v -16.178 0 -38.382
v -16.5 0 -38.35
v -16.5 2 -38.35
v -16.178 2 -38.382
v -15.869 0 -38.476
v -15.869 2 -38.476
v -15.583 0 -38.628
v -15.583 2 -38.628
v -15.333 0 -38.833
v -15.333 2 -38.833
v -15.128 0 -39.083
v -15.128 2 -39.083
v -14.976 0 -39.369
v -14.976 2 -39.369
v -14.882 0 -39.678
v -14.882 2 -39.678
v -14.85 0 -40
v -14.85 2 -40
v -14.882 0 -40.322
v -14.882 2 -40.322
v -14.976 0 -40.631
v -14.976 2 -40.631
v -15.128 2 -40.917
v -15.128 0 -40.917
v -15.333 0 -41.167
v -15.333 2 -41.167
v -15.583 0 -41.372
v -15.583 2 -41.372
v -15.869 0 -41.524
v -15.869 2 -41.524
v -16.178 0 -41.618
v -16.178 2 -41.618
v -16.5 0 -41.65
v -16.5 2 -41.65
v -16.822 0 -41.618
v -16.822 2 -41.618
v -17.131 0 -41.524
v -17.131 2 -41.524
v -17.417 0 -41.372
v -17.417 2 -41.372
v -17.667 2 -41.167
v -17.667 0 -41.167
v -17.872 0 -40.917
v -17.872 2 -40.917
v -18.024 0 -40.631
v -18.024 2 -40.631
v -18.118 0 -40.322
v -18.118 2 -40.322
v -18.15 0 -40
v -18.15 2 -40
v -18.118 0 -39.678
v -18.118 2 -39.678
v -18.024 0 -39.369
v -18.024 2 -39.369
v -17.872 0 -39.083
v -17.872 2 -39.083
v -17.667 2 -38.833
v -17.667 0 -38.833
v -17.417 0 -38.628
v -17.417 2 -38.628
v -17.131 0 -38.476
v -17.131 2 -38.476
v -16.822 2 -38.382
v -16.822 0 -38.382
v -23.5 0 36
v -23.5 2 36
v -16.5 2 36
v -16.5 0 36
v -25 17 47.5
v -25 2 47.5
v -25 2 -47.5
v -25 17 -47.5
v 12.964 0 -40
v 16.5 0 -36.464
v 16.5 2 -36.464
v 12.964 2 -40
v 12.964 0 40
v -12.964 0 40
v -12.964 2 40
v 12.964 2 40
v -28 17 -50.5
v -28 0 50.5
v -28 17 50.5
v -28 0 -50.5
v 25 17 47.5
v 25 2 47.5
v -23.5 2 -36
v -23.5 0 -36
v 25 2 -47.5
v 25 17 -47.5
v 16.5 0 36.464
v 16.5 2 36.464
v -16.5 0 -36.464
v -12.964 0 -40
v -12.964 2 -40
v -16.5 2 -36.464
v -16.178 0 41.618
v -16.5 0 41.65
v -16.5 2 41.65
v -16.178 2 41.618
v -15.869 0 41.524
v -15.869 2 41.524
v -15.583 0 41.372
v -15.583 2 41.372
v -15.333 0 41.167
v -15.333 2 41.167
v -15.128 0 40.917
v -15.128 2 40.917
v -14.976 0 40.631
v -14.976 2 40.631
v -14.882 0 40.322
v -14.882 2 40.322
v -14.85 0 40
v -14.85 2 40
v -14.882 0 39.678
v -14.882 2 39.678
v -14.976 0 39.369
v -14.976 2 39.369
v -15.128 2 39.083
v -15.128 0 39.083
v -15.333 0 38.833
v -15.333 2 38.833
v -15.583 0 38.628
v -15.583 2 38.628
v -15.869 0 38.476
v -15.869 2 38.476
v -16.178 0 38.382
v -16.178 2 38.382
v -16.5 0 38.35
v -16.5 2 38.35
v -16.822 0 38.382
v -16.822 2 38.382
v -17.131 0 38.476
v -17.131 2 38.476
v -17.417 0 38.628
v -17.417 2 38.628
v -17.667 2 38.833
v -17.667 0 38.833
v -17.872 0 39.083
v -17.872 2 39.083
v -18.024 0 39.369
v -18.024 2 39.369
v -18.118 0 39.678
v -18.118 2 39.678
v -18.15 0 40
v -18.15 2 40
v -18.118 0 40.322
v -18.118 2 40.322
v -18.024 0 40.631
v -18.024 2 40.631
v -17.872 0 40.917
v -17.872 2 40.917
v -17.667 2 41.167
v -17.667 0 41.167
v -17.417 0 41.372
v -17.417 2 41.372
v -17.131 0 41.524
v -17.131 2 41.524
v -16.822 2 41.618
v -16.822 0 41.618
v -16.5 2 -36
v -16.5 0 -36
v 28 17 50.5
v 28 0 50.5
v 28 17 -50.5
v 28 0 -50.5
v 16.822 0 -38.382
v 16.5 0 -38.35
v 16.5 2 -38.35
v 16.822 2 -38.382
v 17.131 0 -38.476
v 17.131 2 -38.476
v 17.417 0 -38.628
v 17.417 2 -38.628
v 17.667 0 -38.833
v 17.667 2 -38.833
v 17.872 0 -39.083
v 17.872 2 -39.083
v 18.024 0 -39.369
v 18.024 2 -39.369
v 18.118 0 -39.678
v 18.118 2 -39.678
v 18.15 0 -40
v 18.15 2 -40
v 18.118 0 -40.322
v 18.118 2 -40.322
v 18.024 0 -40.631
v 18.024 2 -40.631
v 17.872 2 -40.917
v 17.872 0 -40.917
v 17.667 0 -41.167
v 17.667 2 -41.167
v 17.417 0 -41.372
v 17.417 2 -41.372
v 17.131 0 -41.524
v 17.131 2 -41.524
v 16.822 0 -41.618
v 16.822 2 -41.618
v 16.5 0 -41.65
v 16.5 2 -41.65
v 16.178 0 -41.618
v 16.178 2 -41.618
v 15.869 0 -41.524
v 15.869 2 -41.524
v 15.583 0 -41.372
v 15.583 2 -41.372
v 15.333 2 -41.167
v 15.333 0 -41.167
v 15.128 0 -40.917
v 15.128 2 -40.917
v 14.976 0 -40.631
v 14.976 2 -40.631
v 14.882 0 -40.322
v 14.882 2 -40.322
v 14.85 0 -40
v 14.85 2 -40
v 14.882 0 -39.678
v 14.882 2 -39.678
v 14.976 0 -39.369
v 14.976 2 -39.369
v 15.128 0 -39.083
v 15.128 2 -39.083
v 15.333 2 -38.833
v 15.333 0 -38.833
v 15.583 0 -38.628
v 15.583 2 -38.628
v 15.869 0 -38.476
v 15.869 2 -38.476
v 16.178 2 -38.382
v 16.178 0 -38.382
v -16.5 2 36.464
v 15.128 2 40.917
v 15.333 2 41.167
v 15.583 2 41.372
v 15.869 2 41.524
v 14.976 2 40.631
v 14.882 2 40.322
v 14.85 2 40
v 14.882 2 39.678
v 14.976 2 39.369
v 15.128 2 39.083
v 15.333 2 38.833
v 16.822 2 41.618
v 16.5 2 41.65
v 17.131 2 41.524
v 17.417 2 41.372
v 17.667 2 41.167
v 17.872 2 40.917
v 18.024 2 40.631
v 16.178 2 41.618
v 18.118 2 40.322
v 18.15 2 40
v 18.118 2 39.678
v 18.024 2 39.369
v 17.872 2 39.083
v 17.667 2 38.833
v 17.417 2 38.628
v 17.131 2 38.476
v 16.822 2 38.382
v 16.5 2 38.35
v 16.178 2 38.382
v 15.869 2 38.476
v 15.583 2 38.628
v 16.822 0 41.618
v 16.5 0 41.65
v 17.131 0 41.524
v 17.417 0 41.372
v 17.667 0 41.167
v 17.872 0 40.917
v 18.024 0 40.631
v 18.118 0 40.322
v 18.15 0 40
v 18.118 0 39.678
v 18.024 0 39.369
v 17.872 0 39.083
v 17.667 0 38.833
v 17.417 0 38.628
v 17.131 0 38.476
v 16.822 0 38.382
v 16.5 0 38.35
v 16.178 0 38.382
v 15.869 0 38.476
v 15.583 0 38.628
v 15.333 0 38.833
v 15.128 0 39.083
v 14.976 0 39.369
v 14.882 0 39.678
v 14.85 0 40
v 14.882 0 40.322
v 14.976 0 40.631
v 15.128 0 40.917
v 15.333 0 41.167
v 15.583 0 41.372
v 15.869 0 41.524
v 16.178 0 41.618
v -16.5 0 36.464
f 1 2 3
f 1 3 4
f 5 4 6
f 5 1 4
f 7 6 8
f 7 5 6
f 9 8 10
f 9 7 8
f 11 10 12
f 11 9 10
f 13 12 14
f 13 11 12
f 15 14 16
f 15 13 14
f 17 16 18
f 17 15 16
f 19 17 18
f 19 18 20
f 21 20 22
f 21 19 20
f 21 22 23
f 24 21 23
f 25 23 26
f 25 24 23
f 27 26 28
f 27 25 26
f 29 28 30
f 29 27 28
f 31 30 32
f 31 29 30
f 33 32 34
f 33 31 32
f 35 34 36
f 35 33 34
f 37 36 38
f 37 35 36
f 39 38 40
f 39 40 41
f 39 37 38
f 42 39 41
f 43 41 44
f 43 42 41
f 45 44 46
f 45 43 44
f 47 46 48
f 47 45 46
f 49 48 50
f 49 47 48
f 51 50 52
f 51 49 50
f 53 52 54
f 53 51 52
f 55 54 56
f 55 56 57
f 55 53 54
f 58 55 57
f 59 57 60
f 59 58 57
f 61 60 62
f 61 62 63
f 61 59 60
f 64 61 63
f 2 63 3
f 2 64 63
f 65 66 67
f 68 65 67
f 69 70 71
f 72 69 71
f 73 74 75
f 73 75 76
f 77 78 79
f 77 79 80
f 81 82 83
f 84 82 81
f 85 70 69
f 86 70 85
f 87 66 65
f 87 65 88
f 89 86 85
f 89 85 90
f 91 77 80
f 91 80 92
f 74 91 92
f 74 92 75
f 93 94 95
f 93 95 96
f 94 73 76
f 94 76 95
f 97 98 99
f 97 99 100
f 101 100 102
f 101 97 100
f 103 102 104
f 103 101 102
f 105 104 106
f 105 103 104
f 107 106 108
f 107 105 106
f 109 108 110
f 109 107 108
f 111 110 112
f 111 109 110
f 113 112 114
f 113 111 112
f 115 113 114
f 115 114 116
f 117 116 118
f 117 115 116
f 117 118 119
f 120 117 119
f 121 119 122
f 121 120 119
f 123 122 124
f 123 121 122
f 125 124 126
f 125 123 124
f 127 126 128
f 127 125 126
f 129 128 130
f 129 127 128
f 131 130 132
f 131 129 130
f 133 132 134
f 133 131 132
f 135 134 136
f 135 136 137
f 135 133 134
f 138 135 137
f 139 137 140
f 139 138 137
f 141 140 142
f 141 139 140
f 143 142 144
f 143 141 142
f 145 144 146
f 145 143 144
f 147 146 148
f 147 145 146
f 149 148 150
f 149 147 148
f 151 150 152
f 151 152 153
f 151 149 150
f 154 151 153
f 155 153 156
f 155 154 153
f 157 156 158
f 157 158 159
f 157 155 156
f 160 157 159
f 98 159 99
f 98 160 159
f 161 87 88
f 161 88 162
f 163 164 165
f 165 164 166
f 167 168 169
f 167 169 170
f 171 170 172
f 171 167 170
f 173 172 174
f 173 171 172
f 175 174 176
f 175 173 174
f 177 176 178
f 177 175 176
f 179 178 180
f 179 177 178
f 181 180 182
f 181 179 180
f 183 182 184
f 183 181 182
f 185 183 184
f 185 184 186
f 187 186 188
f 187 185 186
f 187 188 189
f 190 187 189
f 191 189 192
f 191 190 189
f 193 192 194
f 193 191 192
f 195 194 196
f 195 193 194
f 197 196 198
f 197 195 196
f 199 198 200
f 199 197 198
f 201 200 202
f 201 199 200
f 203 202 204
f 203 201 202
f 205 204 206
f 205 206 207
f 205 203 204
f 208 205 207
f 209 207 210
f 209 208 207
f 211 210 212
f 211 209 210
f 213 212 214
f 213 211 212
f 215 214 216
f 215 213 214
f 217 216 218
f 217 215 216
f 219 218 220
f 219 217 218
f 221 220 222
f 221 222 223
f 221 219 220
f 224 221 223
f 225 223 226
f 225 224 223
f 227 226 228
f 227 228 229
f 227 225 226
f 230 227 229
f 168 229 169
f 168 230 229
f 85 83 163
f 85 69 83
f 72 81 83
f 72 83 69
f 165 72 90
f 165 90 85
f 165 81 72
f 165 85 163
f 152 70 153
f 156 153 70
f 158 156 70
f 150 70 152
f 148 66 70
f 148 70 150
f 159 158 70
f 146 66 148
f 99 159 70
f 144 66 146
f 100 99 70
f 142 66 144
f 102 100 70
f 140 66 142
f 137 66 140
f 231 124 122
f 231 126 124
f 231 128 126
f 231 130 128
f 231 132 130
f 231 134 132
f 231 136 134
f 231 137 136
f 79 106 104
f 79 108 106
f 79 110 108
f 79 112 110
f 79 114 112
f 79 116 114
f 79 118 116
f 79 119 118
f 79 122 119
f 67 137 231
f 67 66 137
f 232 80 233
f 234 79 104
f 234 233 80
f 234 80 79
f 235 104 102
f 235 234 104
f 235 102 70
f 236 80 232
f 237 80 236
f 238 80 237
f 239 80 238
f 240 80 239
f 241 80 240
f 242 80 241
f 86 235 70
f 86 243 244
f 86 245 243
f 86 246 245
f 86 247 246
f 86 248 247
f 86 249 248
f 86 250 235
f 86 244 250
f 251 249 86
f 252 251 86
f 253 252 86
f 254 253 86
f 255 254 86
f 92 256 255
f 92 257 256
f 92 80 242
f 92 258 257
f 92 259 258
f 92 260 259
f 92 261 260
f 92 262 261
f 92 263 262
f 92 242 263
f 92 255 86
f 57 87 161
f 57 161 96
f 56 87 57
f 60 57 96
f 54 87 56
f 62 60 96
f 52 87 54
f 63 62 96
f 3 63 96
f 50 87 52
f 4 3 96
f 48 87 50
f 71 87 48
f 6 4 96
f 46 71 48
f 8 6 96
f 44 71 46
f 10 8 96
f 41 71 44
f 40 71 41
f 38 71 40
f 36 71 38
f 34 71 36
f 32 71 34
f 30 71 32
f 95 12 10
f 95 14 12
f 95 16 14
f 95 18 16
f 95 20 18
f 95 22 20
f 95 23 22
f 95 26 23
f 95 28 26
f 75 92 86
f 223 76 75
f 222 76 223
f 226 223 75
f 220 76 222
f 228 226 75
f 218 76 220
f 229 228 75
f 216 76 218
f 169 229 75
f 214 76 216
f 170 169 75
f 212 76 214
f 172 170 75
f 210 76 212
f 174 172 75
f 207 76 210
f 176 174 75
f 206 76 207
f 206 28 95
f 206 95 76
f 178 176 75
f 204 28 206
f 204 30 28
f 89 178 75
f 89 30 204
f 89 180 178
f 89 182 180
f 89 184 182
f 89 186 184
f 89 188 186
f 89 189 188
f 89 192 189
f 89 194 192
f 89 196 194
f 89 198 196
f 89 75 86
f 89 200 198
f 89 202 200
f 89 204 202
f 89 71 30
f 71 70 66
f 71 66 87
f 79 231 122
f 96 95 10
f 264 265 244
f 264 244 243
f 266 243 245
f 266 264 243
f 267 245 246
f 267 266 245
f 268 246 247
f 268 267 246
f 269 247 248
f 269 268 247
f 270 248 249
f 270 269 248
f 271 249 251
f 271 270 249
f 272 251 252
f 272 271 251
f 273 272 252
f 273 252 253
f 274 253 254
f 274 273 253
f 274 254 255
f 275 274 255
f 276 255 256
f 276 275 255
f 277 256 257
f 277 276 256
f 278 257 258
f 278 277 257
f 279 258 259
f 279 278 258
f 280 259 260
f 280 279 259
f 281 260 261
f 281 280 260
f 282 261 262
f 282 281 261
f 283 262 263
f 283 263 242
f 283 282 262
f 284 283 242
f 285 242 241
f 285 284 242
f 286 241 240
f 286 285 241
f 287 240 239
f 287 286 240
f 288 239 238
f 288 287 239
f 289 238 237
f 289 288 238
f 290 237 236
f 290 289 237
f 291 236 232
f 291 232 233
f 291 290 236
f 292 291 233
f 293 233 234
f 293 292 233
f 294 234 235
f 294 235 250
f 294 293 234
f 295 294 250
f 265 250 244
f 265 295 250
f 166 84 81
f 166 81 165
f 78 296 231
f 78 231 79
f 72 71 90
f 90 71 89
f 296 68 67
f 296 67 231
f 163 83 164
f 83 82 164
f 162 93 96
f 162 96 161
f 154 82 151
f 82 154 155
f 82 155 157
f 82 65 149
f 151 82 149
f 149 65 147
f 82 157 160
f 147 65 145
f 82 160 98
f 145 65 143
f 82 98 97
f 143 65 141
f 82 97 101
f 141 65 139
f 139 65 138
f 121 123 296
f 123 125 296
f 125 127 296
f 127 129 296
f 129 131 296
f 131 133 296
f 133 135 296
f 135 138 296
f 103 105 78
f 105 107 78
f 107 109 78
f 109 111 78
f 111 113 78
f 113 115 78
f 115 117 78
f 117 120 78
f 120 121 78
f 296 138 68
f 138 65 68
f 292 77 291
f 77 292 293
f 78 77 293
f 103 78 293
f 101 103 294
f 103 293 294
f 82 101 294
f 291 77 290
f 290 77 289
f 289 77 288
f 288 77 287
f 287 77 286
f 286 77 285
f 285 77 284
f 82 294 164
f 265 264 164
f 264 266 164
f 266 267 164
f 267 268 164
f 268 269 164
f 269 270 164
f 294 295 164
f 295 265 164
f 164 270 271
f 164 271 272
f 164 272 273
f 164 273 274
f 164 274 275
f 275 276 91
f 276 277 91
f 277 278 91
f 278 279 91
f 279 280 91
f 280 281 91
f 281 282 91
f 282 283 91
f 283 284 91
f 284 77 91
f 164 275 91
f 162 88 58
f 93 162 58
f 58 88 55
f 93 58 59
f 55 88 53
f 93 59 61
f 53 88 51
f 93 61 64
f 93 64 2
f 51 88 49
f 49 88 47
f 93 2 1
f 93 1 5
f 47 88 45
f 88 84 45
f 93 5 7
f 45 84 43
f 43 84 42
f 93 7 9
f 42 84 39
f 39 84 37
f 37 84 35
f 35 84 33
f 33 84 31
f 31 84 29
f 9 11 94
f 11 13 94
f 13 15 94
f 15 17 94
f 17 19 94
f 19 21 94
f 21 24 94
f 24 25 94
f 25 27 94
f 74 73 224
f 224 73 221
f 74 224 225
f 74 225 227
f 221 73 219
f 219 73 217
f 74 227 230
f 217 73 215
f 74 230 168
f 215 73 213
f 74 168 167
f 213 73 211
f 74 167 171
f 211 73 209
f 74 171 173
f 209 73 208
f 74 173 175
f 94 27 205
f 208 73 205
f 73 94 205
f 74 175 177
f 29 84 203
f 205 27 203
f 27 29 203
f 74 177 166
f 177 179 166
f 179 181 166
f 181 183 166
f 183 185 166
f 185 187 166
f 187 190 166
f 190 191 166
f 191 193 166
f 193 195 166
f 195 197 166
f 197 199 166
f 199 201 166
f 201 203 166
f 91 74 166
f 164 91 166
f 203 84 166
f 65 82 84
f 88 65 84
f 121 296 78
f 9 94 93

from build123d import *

# Parameters (mm, degrees)
SKETCH1_W           = 56
SKETCH1_H           = 101
SKETCH1_R           = 1.65
BOSS_EXTRUDE1_DEPTH = 2
SKETCH3_W           = 56
SKETCH3_H           = 101
SKETCH3_W_2         = 50
SKETCH3_H_2         = 95
BOSS_EXTRUDE2_DEPTH = 15
SKETCH5_W           = 7
SKETCH5_H           = 72
CUT_EXTRUDE2_DEPTH  = 60.659450215


with BuildPart() as part:
    # Sketch1 → Boss-Extrude1 (new body)
    with BuildSketch(Plane(origin=(0, 0, 0), x_dir=(1, 0, 0), z_dir=(0, 1, 0))):
        Rectangle(SKETCH1_W, SKETCH1_H)
        with Locations(Location((-16.5, 40, 0), (0, 0, 270))):
            Circle(SKETCH1_R, mode=Mode.SUBTRACT)
        with Locations(Location((16.5, 40, 0), (0, 0, 270))):
            Circle(SKETCH1_R, mode=Mode.SUBTRACT)
        with Locations(Location((-16.5, -40, 0), (0, 0, 270))):
            Circle(SKETCH1_R, mode=Mode.SUBTRACT)
        with Locations(Location((16.5, -40, 0), (0, 0, 270))):
            Circle(SKETCH1_R, mode=Mode.SUBTRACT)
        Polygon((-12.964466094, -40), (12.964466094, -40), (16.5, -36.464466094), (16.5, 36.464466094), (12.964466094, 40), (-12.964466094, 40), (-16.5, 36.464466094), (-16.5, -36.464466094), align=None, mode=Mode.SUBTRACT)
    extrude(amount=BOSS_EXTRUDE1_DEPTH)

    # Sketch3 → Boss-Extrude2 (add)
    with BuildSketch(Plane(origin=(0, 2, 0), x_dir=(1, 0, 0), z_dir=(0, 1, 0))):
        Rectangle(SKETCH3_W, SKETCH3_H)
        Rectangle(SKETCH3_W_2, SKETCH3_H_2, mode=Mode.SUBTRACT)
    extrude(amount=BOSS_EXTRUDE2_DEPTH)

    # Sketch5 → Cut-Extrude2 (cut, through all)
    with BuildSketch(Plane(origin=(0, 2, 0), x_dir=(1, 0, 0), z_dir=(0, 1, 0))):
        with Locations((-20, 0)):
            Rectangle(SKETCH5_W, SKETCH5_H)
    extrude(amount=-CUT_EXTRUDE2_DEPTH, mode=Mode.SUBTRACT)


solid = part.part
